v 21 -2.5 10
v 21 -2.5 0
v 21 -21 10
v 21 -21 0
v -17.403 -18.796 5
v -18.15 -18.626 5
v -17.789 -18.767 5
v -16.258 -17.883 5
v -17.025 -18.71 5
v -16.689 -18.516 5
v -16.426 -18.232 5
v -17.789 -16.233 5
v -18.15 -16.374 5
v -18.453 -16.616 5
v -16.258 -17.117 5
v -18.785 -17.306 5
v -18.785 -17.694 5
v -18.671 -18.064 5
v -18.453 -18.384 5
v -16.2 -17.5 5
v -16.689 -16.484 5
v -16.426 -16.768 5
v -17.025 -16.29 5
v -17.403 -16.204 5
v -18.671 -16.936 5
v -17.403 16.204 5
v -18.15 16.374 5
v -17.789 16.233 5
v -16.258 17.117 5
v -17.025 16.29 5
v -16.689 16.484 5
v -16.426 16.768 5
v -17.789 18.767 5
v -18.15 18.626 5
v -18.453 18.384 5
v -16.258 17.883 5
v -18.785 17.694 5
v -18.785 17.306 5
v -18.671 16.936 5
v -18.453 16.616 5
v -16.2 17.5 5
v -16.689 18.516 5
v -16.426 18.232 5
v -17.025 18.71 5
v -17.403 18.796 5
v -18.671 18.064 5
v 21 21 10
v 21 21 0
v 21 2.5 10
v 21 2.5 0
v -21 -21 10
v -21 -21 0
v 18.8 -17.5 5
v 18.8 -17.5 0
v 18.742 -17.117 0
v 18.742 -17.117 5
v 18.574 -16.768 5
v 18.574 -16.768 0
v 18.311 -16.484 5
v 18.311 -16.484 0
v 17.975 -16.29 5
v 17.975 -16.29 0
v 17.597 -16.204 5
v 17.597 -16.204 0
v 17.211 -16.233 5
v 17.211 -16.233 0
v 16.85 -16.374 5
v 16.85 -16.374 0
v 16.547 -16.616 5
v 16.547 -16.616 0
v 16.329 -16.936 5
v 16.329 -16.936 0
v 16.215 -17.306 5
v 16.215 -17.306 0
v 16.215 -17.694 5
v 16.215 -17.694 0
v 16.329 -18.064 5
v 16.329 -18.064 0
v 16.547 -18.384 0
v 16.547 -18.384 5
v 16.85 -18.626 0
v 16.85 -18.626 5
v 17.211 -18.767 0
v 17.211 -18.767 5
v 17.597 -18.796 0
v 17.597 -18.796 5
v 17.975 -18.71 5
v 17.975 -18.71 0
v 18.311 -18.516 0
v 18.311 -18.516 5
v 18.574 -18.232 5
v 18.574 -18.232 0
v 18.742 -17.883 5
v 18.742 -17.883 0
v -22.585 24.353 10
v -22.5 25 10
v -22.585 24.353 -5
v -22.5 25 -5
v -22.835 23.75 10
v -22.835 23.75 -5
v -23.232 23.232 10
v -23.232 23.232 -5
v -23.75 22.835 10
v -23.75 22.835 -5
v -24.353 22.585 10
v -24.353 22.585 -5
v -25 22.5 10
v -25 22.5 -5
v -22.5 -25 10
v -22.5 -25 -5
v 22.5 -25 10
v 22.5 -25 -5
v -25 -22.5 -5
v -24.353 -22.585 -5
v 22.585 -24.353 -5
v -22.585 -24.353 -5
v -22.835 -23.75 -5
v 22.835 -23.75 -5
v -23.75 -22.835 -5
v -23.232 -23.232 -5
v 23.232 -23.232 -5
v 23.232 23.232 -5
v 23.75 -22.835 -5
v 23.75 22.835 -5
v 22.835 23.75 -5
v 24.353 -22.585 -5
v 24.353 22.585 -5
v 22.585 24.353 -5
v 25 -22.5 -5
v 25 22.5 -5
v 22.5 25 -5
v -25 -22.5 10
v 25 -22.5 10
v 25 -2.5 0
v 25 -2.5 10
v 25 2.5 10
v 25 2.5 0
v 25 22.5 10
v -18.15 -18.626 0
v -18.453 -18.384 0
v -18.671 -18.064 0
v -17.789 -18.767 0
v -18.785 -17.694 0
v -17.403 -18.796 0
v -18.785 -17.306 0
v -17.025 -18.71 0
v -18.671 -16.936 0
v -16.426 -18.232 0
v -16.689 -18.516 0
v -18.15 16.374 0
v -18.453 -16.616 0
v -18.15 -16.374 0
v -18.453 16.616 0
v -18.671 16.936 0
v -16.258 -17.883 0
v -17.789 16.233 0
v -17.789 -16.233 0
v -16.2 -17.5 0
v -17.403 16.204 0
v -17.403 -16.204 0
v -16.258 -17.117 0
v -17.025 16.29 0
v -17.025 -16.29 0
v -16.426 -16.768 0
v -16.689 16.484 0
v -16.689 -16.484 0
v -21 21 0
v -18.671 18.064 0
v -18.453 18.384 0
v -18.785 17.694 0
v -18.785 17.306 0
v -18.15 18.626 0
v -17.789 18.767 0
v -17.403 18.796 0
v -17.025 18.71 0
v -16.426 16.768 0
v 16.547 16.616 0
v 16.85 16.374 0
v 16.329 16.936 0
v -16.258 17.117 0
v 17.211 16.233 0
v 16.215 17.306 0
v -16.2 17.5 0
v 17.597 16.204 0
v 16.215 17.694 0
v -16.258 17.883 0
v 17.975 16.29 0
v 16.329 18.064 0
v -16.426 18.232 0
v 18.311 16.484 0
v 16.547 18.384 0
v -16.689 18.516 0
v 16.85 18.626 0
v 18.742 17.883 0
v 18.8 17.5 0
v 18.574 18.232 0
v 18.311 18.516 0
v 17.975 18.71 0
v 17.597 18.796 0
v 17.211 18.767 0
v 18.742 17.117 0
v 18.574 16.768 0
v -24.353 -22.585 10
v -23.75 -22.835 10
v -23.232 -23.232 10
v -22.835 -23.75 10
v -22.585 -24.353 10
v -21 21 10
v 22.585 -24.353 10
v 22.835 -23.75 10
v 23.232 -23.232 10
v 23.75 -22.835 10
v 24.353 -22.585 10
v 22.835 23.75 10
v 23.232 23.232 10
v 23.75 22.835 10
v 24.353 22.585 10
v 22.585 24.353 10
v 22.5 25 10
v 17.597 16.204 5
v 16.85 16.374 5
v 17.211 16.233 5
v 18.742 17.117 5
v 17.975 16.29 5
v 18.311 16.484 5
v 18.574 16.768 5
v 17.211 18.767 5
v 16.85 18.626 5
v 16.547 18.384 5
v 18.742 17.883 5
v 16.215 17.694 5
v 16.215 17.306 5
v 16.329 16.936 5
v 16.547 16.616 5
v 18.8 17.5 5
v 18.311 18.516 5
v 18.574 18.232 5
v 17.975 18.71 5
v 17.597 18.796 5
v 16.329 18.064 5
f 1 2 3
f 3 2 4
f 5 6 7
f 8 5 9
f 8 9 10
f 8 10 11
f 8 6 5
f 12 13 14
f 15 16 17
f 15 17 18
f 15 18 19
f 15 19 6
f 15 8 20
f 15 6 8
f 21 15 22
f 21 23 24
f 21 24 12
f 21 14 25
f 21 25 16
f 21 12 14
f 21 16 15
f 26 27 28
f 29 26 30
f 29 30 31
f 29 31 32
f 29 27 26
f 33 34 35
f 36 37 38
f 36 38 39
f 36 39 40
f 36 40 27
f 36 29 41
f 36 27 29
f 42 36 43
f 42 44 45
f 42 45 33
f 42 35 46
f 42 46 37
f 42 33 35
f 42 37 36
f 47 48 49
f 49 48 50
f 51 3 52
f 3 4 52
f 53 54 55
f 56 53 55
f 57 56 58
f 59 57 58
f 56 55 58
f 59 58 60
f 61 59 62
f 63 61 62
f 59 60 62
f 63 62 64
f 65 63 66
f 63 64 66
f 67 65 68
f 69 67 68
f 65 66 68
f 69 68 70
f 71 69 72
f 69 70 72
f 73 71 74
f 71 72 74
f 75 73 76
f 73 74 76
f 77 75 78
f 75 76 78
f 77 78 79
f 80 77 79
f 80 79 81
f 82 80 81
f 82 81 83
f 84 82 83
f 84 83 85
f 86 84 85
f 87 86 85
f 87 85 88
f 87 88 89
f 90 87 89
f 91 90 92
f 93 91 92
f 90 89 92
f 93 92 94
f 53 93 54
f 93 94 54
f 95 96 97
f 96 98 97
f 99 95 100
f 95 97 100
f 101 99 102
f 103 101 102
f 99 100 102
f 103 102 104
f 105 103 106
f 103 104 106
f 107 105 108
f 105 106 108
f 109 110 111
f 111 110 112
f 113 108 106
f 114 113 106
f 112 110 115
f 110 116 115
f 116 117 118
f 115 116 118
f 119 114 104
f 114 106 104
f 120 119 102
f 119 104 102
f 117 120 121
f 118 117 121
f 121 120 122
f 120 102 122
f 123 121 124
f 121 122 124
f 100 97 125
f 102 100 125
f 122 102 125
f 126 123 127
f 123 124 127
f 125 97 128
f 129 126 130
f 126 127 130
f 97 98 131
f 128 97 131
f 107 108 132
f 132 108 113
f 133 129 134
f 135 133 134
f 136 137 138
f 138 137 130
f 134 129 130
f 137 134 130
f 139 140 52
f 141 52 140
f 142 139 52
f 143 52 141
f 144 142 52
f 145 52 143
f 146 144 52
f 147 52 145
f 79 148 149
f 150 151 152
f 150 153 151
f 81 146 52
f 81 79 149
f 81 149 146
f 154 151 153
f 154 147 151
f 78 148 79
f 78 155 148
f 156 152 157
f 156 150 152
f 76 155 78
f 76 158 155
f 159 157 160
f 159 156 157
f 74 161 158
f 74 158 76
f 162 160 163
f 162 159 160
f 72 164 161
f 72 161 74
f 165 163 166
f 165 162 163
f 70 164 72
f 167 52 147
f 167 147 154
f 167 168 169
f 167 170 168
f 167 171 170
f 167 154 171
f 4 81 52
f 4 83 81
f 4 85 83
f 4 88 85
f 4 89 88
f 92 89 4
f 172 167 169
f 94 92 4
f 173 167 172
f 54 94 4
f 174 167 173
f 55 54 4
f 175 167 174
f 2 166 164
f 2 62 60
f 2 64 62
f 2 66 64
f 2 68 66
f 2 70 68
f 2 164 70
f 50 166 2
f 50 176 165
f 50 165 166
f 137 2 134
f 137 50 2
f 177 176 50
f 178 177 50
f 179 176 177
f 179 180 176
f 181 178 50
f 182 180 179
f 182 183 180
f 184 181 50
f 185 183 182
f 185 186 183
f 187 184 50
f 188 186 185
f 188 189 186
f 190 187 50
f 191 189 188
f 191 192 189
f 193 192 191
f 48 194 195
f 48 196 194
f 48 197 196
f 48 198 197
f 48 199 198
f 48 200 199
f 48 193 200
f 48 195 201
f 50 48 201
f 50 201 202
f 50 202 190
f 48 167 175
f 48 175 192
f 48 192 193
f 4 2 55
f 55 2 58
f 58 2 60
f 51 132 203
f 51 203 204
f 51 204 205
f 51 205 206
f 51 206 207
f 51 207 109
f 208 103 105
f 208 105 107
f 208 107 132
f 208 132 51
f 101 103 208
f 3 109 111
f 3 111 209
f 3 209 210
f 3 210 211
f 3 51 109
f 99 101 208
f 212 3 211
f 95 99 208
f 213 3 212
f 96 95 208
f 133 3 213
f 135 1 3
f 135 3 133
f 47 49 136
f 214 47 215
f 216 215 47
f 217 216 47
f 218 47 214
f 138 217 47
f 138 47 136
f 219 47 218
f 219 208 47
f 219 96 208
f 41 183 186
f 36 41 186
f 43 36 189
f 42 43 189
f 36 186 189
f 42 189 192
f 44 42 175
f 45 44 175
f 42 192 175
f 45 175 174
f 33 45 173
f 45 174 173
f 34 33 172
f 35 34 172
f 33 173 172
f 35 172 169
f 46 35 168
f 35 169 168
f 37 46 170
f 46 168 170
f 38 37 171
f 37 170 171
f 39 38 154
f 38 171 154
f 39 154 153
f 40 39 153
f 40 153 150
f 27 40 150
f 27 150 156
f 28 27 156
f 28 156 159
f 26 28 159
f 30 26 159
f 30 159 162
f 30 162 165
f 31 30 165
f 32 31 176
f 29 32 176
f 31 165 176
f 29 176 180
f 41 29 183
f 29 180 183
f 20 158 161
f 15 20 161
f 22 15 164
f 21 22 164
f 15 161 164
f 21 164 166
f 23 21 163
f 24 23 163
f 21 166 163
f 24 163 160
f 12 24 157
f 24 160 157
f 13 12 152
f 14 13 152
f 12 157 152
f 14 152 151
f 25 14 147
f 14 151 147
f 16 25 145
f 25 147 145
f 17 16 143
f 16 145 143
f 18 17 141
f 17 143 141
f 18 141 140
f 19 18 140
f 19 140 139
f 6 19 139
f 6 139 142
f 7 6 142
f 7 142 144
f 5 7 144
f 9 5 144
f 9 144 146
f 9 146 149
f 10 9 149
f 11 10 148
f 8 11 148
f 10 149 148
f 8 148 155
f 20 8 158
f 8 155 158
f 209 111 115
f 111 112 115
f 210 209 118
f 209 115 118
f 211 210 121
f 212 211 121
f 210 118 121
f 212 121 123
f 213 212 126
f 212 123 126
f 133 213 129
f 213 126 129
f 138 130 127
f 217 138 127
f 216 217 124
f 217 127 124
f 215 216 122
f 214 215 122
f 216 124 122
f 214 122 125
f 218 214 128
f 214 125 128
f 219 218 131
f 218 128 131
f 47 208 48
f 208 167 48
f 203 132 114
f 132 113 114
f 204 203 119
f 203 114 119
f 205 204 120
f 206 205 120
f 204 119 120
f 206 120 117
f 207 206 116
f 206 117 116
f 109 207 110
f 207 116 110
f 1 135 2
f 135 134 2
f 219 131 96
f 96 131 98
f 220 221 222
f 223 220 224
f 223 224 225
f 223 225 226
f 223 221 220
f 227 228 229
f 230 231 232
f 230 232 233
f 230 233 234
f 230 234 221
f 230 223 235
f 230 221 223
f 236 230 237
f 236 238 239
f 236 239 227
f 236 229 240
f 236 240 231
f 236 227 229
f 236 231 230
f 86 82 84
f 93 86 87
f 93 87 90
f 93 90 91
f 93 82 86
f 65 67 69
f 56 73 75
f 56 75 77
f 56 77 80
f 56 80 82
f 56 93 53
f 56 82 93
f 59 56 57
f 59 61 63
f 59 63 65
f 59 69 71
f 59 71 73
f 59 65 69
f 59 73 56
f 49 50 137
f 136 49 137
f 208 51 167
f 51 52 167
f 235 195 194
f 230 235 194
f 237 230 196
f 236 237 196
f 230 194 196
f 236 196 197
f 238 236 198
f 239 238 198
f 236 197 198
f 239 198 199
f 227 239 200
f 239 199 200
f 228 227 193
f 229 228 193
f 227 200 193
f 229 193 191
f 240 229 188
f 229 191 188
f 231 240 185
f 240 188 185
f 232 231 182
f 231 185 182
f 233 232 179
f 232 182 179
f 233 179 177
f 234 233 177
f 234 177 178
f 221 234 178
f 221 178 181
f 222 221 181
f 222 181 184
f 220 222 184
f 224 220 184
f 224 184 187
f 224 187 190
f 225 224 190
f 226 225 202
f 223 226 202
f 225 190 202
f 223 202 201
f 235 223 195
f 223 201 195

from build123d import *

# Parameters (mm, degrees)
F1_DEPTH = 5
F0_R     = 1.3
F3_DEPTH = 5
F4_DEPTH = 5


with BuildPart() as f1:
    # F0 (on Top) → F1 (new body)
    with BuildSketch(Plane.XY):
        with BuildLine():
            ThreePointArc((25, 22.5), (23.232233047, 23.232233047), (22.5, 25))
            Line((22.5, 25), (-22.5, 25))
            ThreePointArc((-22.5, 25), (-23.232233047, 23.232233047), (-25, 22.5))
            Line((-25, 22.5), (-25, -22.5))
            ThreePointArc((-25, -22.5), (-23.232233047, -23.232233047), (-22.5, -25))
            Line((-22.5, -25), (22.5, -25))
            ThreePointArc((22.5, -25), (23.232233047, -23.232233047), (25, -22.5))
            Line((25, -22.5), (25, -2.5))
            Line((25, -2.5), (21, -2.5))
            Line((21, -2.5), (21, -21))
            Line((21, -21), (-21, -21))
            Line((-21, -21), (-21, 21))
            Line((-21, 21), (21, 21))
            Line((21, 21), (21, 2.5))
            Line((21, 2.5), (25, 2.5))
            Line((25, 2.5), (25, 22.5))
        make_face()
    extrude(amount=F1_DEPTH)



with BuildPart() as f1b:
    # F0 (on Top) → F1, piece 2 (new body)
    with BuildSketch(Plane.XY):
        with Locations((-17.5, 17.5)):
            Circle(F0_R)
    extrude(amount=F1_DEPTH)


with BuildPart() as f1c:
    # F0 (on Top) → F1, piece 3 (new body)
    with BuildSketch(Plane.XY):
        with Locations((-17.5, -17.5)):
            Circle(F0_R)
    extrude(amount=F1_DEPTH)


with BuildPart() as f1d:
    # F0 (on Top) → F1, piece 4 (new body)
    with BuildSketch(Plane.XY):
        with Locations((17.5, -17.5)):
            Circle(F0_R)
    extrude(amount=F1_DEPTH)


with BuildPart() as f1e:
    # F0 (on Top) → F1, piece 5 (new body)
    with BuildSketch(Plane.XY):
        with Locations((17.5, 17.5)):
            Circle(F0_R)
    extrude(amount=F1_DEPTH)


with BuildPart() as f1_1:
    add(f1.part)

    add(f1b.part)  # F3 merges F1b

    add(f1c.part)  # F3 merges F1c

    add(f1d.part)  # F3 merges F1d

    add(f1e.part)  # F3 merges F1e
    # F2 (on face) → F3 (join)
    with BuildSketch(Plane.XY):
        with BuildLine():
            Line((-22.5, -25), (22.5, -25))
            ThreePointArc((22.5, -25), (23.232233047, -23.232233047), (25, -22.5))
            Line((25, -22.5), (25, -2.5))
            Line((25, -2.5), (21, -2.5))
            Line((21, -2.5), (21, -21))
            Line((21, -21), (-21, -21))
            Line((-21, -21), (-21, 21))
            Line((-21, 21), (21, 21))
            Line((21, 21), (21, 2.5))
            Line((21, 2.5), (25, 2.5))
            Line((25, 2.5), (25, 22.5))
            ThreePointArc((25, 22.5), (23.232233047, 23.232233047), (22.5, 25))
            Line((22.5, 25), (-22.5, 25))
            ThreePointArc((-22.5, 25), (-23.232233047, 23.232233047), (-25, 22.5))
            Line((-25, 22.5), (-25, -22.5))
            ThreePointArc((-25, -22.5), (-23.232233047, -23.232233047), (-22.5, -25))
        make_face()
        Polygon((21, -2.5), (25, -2.5), (25, 2.5), (21, 2.5), (21, 21), (-21, 21), (-21, -21), (21, -21), align=None)
    extrude(amount=-F3_DEPTH)

    # F4 (add): a face of the model
    f4_faces = [f1_1.faces().sort_by_distance(p)[0] for p in [
        (22.732233047, 22.732233047, 5),
    ]]
    extrude(f4_faces, amount=F4_DEPTH)


solid = f1_1.part
